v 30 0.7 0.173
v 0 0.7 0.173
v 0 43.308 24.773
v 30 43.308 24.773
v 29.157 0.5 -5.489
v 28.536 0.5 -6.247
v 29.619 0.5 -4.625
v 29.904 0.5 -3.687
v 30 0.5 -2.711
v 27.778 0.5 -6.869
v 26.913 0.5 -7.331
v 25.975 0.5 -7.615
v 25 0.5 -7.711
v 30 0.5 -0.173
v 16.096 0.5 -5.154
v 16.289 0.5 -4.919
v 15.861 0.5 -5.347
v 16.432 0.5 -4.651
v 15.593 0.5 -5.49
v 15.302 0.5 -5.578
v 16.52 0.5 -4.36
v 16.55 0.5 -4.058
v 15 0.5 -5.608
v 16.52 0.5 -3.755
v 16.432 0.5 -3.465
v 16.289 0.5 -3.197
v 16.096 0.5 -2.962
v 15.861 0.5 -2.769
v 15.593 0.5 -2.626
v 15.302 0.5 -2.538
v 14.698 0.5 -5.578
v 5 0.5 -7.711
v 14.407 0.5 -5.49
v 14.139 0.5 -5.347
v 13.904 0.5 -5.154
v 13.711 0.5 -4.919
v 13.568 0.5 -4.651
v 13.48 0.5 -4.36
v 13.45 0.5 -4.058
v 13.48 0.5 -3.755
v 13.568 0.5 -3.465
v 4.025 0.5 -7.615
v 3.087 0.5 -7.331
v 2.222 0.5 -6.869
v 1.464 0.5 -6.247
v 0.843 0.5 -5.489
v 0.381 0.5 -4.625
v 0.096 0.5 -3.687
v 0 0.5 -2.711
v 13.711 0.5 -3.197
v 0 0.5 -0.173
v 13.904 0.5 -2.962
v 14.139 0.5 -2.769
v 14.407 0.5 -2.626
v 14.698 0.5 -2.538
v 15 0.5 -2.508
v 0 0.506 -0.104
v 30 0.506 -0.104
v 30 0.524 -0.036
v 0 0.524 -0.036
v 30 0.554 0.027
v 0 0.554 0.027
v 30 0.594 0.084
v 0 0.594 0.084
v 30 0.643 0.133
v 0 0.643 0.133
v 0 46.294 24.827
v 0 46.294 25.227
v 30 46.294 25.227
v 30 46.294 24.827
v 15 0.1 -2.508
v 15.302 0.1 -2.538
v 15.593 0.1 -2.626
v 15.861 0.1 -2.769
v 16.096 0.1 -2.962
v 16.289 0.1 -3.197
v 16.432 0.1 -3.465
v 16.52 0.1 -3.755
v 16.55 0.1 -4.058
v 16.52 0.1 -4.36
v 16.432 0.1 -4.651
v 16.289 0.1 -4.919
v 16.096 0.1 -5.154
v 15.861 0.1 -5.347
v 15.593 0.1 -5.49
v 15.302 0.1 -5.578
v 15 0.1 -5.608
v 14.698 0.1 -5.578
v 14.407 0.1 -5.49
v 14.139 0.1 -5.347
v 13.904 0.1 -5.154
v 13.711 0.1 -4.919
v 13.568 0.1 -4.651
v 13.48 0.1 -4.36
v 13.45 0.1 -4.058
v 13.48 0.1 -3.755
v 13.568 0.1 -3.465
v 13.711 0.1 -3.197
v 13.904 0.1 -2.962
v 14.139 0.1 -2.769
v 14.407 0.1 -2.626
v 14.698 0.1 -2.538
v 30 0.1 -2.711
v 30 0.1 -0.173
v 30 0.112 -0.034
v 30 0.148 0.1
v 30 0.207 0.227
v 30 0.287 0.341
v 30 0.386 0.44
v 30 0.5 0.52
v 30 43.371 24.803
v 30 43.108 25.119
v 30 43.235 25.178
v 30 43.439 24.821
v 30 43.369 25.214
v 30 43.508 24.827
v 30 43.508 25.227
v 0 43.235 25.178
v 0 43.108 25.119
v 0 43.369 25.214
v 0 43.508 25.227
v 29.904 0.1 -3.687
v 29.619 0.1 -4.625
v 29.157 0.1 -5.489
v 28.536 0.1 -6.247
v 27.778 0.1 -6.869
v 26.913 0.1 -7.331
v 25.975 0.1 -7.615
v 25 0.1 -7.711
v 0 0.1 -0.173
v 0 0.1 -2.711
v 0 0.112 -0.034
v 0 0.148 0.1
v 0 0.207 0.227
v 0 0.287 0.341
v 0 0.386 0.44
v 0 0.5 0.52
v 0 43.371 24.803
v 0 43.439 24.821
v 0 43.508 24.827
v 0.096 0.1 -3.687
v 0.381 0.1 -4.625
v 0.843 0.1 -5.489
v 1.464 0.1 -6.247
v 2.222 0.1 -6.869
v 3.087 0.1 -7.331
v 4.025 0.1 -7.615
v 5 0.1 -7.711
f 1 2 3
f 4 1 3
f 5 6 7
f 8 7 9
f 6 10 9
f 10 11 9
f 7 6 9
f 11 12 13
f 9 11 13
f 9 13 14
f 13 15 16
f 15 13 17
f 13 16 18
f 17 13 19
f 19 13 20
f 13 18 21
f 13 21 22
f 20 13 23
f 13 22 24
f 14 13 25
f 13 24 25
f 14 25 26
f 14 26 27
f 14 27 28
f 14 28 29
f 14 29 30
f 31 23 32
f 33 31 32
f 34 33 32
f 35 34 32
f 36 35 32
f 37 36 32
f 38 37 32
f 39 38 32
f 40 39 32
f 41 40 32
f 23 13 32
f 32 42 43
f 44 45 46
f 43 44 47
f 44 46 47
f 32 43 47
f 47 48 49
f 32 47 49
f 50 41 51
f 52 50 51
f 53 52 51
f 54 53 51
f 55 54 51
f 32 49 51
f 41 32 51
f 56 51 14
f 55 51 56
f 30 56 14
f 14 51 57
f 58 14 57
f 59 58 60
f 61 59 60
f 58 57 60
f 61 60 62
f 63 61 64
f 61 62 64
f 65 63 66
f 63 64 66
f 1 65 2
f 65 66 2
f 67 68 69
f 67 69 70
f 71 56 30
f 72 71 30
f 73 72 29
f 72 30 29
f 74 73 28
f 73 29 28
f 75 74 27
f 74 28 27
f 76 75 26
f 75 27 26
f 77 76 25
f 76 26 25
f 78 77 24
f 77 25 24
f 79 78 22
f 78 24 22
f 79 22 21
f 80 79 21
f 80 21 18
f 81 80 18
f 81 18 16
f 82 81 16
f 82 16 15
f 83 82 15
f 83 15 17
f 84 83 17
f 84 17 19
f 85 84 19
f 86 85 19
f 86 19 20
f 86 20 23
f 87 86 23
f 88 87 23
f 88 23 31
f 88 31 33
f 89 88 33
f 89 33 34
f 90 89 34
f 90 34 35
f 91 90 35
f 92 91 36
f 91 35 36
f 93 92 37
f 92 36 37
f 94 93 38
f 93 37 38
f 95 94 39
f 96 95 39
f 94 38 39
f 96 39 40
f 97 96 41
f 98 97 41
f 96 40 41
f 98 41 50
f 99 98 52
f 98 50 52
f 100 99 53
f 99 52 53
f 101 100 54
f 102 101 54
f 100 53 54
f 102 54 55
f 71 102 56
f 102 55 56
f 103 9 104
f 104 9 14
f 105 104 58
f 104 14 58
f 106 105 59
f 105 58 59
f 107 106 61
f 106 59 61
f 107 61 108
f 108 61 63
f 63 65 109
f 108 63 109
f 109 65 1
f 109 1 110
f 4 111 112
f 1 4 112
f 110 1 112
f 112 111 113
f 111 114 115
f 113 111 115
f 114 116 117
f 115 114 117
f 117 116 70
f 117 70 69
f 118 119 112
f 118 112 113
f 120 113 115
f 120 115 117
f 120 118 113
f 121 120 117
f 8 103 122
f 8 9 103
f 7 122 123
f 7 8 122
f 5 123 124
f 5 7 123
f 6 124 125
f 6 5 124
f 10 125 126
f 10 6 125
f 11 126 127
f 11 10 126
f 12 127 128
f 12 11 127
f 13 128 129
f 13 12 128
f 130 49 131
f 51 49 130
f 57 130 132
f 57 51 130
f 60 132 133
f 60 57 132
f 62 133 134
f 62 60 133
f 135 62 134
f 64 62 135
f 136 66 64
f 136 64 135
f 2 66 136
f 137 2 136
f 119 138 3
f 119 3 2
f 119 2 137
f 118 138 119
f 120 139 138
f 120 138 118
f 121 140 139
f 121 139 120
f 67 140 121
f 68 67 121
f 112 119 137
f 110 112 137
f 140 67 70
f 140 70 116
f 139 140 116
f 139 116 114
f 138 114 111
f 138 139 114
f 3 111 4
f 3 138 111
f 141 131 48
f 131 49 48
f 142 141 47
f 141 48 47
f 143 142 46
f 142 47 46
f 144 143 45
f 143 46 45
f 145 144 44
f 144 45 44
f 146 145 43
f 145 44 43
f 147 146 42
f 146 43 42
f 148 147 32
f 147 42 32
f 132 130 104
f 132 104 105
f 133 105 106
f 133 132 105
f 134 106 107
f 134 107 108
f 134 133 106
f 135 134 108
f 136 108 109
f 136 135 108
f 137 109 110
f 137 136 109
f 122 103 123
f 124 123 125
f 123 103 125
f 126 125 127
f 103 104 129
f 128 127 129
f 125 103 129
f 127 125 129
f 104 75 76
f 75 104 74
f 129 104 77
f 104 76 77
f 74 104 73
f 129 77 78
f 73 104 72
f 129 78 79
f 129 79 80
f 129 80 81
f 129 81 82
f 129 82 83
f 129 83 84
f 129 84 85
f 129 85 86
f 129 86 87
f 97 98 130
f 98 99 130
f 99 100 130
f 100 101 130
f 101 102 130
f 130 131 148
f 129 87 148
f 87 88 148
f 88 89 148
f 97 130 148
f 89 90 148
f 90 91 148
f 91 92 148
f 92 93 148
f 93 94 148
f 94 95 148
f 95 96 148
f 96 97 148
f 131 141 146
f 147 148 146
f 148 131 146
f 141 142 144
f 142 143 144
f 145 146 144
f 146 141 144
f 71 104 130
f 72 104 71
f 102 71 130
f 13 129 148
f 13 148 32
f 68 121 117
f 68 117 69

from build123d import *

# Parameters (mm, degrees)
BOSS_EXTRUDE1_DEPTH          = 30
EDGE_FLANGE1_DEPTH           = 30
EDGE_FLANGE1_2_DEPTH         = 30
EDGE_FLANGE2_STRIP_CUT_DEPTH = 30
EDGE_FLANGE2_DEPTH           = 30
SKETCH12_R                   = 1.55
CUT_EXTRUDE1_DEPTH           = 61.278165958
FILLET1_R                    = 5


# Read off the part's stored shape, not the designer's step: Edge-Flange1
# Sheet-metal steps are written as plain solids
with BuildPart() as part:
    # Sketch1 → Boss-Extrude1 (new body)
    with BuildSketch(Plane(origin=(0, 0, 0), x_dir=(0, 0, -1), z_dir=(1, 0, 0))):
        Polygon((-24.826638925, 43.401), (-25.173049087, 43.201), (-0.173205081, -0.1), (0.173205081, 0.1), align=None)
    extrude(amount=BOSS_EXTRUDE1_DEPTH)

    # Edge-Flange1 outline → Edge-Flange1 (cut)
    with BuildSketch(Plane.YZ):
        with BuildLine():
            Line((-0.1, 0.173205081), (0.1, -0.173205081))
            ThreePointArc((0.1, -0.173205081), (0.207179677, 0.226794919), (0.5, 0.519615242))
            Line((0.5, 0.519615242), (-0.1, 0.173205081))
        make_face()
    extrude(amount=EDGE_FLANGE1_DEPTH, mode=Mode.SUBTRACT)

    # Edge-Flange1 2 outline → Edge-Flange1 2 (add)
    with BuildSketch(Plane.YZ):
        with BuildLine():
            Line((0.7, 0.173205081), (0.1, -0.173205081))
            Line((0.1, -0.173205081), (0.1, -7.711324865))
            Line((0.1, -7.711324865), (0.5, -7.711324865))
            Line((0.5, -7.711324865), (0.5, -0.173205081))
            ThreePointArc((0.5, -0.173205081), (0.553589838, 0.026794919), (0.7, 0.173205081))
        make_face()
    extrude(amount=EDGE_FLANGE1_2_DEPTH)

    # Edge-Flange2 strip (across the edge) → Edge-Flange2 strip cut (cut)
    with BuildSketch(Plane(origin=(0, 43.401, 24.826638925), x_dir=(0, 0, -1), z_dir=(1, 0, 0))):
        Polygon((-1.492820323, 1.785640646), (-0.292820323, -0.292820323), (0.053589838, -0.092820323), (-1.146410162, 1.985640646), align=None)
    extrude(amount=EDGE_FLANGE2_STRIP_CUT_DEPTH, mode=Mode.SUBTRACT)

    # Edge-Flange2 section (across the edge) → Edge-Flange2 (add)
    with BuildSketch(Plane(origin=(0, 43.401, 24.826638925), x_dir=(0, 0, -1), z_dir=(1, 0, 0))):
        with BuildLine():
            Line((-0.4, 0.107179677), (-0.4, 2.892820323))
            Line((-0.4, 2.892820323), (0, 2.892820323))
            Line((0, 2.892820323), (0, 0.107179677))
            ThreePointArc((0, 0.107179677), (0.013629669, 0.003652059), (0.053589838, -0.092820323))
            Line((0.053589838, -0.092820323), (-0.292820323, -0.292820323))
            ThreePointArc((-0.292820323, -0.292820323), (-0.372740661, -0.099875559), (-0.4, 0.107179677))
        make_face()
    extrude(amount=EDGE_FLANGE2_DEPTH)

    # Sketch12 → Cut-Extrude1 (cut, through all)
    with BuildSketch(Plane(origin=(0, 0.5, 0), x_dir=(1, 0, 0), z_dir=(0, 1, 0))):
        with Locations(Location((15, 4.057735027, 0), (0, 0, 270))):
            Circle(SKETCH12_R)
    extrude(amount=-CUT_EXTRUDE1_DEPTH, mode=Mode.SUBTRACT)

    # Fillet1
    fillet1_edges = [part.edges().sort_by_distance(p)[0] for p in [
        (30, 0.3, -7.711324865),
        (0, 0.3, -7.711324865),
    ]]
    fillet(fillet1_edges, radius=FILLET1_R)


solid = part.part
